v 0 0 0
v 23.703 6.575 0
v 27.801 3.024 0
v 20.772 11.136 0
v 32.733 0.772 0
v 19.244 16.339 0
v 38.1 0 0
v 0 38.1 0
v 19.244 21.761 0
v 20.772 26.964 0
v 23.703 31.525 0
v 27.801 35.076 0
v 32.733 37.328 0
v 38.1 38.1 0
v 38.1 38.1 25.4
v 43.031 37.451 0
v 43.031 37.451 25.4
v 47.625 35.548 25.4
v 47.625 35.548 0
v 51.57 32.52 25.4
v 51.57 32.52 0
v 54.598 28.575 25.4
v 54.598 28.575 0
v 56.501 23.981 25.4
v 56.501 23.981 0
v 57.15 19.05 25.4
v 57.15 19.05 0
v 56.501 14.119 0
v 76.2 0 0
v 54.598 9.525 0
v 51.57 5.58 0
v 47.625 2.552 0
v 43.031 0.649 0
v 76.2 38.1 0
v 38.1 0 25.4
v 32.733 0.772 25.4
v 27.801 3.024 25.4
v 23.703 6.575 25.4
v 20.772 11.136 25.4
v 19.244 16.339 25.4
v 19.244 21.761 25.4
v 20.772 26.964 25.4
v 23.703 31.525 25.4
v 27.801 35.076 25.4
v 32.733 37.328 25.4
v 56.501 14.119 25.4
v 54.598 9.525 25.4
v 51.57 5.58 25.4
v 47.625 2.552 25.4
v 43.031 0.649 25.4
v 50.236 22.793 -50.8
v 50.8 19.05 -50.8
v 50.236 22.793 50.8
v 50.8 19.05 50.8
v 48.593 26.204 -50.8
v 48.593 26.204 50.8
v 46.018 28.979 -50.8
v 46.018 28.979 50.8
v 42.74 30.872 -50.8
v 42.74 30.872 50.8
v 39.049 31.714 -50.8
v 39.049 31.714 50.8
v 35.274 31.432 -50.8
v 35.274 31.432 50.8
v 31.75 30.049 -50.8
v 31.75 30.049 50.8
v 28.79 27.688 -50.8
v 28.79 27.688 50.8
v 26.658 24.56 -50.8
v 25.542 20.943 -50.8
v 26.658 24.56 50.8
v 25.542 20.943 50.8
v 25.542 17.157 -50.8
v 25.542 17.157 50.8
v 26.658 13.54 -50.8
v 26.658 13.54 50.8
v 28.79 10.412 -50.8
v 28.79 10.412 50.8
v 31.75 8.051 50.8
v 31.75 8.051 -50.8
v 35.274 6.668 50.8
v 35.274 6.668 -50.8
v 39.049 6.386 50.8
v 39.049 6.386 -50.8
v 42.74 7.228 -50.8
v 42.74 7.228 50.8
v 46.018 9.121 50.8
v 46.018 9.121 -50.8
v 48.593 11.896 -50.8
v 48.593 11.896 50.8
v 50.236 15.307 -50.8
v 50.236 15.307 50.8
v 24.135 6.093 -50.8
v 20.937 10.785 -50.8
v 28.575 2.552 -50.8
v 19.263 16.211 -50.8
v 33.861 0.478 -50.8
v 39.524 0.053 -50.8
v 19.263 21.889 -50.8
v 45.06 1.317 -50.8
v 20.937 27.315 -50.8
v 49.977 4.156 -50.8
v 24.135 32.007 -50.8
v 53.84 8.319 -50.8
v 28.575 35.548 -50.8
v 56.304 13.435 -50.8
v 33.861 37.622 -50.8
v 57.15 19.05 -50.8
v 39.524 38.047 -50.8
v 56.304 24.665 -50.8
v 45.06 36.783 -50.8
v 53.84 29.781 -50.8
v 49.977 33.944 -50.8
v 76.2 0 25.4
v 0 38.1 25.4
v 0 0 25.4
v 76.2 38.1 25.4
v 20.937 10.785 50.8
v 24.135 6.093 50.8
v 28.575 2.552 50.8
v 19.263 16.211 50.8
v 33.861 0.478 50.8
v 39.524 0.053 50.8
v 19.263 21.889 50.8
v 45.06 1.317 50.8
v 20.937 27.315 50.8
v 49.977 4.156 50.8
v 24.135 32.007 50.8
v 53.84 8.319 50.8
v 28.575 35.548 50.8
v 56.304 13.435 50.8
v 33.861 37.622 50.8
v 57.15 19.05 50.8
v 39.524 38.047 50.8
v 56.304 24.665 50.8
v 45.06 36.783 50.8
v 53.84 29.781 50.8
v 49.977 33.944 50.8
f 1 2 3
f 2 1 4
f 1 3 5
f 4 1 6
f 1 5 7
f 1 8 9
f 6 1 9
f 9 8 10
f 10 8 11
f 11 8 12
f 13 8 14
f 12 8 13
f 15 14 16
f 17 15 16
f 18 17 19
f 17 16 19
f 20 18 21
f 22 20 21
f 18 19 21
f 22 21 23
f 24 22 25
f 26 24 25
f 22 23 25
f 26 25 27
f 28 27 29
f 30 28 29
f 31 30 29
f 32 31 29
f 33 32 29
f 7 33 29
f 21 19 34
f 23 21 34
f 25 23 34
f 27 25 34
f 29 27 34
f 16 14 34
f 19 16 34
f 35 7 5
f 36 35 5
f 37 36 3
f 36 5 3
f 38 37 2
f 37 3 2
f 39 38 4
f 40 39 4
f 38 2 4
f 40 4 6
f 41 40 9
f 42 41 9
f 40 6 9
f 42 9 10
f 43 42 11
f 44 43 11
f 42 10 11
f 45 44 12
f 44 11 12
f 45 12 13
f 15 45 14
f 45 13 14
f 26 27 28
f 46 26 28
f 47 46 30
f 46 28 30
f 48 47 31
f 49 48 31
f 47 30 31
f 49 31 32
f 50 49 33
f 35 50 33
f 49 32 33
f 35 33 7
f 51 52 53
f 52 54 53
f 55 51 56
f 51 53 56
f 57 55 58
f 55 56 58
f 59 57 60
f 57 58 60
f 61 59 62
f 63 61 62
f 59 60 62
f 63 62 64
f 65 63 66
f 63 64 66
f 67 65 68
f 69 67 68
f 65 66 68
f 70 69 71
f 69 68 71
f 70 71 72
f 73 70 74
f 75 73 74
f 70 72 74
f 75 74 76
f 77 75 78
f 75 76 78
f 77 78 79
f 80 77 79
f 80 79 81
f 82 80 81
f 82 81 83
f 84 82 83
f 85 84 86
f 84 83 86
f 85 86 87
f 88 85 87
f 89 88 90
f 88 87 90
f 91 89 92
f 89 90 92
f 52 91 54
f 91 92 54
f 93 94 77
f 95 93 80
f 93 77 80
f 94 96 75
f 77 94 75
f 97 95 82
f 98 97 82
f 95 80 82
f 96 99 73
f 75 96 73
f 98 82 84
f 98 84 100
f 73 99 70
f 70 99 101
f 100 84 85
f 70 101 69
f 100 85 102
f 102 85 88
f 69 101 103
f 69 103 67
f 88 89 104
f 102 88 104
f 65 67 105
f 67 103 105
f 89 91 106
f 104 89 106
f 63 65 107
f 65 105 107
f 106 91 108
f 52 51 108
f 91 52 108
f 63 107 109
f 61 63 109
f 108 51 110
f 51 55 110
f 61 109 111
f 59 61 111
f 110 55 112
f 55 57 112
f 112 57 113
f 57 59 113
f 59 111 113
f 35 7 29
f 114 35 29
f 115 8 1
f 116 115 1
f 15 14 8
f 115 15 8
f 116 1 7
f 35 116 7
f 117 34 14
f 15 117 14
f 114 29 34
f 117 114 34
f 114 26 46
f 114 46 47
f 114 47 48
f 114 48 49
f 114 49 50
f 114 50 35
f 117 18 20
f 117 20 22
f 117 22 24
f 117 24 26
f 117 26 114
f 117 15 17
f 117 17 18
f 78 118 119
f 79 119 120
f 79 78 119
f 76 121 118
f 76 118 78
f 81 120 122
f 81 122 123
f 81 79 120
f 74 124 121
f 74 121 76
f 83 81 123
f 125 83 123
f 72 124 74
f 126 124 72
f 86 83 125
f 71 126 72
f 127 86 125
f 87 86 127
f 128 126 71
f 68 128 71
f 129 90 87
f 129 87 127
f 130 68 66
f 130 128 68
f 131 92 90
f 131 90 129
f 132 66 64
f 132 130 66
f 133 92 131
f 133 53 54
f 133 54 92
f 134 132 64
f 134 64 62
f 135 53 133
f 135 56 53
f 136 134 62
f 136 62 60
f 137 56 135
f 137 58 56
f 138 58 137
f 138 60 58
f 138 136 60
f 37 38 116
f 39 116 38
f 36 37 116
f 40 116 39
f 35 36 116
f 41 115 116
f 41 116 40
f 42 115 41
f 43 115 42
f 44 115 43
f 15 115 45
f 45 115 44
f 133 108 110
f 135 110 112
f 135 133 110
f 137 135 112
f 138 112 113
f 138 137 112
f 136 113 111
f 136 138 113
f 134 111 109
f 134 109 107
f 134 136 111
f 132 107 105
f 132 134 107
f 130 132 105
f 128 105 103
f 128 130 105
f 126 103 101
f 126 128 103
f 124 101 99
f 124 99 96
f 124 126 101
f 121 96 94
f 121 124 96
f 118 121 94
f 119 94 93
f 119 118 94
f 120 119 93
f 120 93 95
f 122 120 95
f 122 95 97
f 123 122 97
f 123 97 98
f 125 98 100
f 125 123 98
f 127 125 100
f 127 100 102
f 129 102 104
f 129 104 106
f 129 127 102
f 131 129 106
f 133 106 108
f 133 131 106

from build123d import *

# Parameters (mm, degrees)
F1_DEPTH = 25.4
F0_R     = 9.525
F2_DEPTH = 50.8
F3_R     = 12.7
F4_DEPTH = 50.801
F5_DEPTH = 50.8


with BuildPart() as f1:
    # F0 (on Top) → F1 (new body)
    with BuildSketch(Plane.XY):
        with BuildLine():
            Line((0, 38.1), (0, 0))
            Line((0, 0), (38.1, 0))
            ThreePointArc((38.1, 0), (19.05, 19.05), (38.1, 38.1))
            Line((38.1, 38.1), (0, 38.1))
        make_face()
    extrude(amount=F1_DEPTH)


with BuildPart() as f1b:
    # F0 (on Top) → F1, piece 2 (new body)
    with BuildSketch(Plane.XY):
        with BuildLine():
            ThreePointArc((57.15, 19.05), (51.5703841816, 5.5796158184), (38.1, 0))
            Line((38.1, 0), (76.2, 0))
            Line((76.2, 0), (76.2, 38.1))
            Line((76.2, 38.1), (38.1, 38.1))
            ThreePointArc((38.1, 38.1), (51.5703841816, 32.5203841816), (57.15, 19.05))
        make_face()
    extrude(amount=F1_DEPTH)


with BuildPart() as f2:
    # F0 (on Top) → F2 (new body)
    with BuildSketch(Plane.XY):
        with BuildLine():
            ThreePointArc((38.1, 38.1), (19.05, 19.05), (38.1, 0))
            ThreePointArc((38.1, 0), (51.5703841816, 5.5796158184), (57.15, 19.05))
            ThreePointArc((57.15, 19.05), (51.5703841816, 32.5203841816), (38.1, 38.1))
        make_face()
        with Locations((38.1, 19.05)):
            Circle(F0_R, mode=Mode.SUBTRACT)
        with Locations((38.1, 19.05)):
            Circle(F0_R)
    extrude(amount=F2_DEPTH)

    # F3 (on face) → F4 (cut, through all)
    with BuildSketch(Plane.XY.offset(50.8)):
        with Locations((38.1, 19.05)):
            Circle(F3_R)
    extrude(amount=-F4_DEPTH, mode=Mode.SUBTRACT)

    # F5 (add): a face of the model
    f5_faces = [f2.faces().sort_by_distance(p)[0] for p in [
        (38.1, 37.5611846327, 0),
    ]]
    extrude(f5_faces, amount=F5_DEPTH)


solid = Compound([f1.part, f1b.part, f2.part])
